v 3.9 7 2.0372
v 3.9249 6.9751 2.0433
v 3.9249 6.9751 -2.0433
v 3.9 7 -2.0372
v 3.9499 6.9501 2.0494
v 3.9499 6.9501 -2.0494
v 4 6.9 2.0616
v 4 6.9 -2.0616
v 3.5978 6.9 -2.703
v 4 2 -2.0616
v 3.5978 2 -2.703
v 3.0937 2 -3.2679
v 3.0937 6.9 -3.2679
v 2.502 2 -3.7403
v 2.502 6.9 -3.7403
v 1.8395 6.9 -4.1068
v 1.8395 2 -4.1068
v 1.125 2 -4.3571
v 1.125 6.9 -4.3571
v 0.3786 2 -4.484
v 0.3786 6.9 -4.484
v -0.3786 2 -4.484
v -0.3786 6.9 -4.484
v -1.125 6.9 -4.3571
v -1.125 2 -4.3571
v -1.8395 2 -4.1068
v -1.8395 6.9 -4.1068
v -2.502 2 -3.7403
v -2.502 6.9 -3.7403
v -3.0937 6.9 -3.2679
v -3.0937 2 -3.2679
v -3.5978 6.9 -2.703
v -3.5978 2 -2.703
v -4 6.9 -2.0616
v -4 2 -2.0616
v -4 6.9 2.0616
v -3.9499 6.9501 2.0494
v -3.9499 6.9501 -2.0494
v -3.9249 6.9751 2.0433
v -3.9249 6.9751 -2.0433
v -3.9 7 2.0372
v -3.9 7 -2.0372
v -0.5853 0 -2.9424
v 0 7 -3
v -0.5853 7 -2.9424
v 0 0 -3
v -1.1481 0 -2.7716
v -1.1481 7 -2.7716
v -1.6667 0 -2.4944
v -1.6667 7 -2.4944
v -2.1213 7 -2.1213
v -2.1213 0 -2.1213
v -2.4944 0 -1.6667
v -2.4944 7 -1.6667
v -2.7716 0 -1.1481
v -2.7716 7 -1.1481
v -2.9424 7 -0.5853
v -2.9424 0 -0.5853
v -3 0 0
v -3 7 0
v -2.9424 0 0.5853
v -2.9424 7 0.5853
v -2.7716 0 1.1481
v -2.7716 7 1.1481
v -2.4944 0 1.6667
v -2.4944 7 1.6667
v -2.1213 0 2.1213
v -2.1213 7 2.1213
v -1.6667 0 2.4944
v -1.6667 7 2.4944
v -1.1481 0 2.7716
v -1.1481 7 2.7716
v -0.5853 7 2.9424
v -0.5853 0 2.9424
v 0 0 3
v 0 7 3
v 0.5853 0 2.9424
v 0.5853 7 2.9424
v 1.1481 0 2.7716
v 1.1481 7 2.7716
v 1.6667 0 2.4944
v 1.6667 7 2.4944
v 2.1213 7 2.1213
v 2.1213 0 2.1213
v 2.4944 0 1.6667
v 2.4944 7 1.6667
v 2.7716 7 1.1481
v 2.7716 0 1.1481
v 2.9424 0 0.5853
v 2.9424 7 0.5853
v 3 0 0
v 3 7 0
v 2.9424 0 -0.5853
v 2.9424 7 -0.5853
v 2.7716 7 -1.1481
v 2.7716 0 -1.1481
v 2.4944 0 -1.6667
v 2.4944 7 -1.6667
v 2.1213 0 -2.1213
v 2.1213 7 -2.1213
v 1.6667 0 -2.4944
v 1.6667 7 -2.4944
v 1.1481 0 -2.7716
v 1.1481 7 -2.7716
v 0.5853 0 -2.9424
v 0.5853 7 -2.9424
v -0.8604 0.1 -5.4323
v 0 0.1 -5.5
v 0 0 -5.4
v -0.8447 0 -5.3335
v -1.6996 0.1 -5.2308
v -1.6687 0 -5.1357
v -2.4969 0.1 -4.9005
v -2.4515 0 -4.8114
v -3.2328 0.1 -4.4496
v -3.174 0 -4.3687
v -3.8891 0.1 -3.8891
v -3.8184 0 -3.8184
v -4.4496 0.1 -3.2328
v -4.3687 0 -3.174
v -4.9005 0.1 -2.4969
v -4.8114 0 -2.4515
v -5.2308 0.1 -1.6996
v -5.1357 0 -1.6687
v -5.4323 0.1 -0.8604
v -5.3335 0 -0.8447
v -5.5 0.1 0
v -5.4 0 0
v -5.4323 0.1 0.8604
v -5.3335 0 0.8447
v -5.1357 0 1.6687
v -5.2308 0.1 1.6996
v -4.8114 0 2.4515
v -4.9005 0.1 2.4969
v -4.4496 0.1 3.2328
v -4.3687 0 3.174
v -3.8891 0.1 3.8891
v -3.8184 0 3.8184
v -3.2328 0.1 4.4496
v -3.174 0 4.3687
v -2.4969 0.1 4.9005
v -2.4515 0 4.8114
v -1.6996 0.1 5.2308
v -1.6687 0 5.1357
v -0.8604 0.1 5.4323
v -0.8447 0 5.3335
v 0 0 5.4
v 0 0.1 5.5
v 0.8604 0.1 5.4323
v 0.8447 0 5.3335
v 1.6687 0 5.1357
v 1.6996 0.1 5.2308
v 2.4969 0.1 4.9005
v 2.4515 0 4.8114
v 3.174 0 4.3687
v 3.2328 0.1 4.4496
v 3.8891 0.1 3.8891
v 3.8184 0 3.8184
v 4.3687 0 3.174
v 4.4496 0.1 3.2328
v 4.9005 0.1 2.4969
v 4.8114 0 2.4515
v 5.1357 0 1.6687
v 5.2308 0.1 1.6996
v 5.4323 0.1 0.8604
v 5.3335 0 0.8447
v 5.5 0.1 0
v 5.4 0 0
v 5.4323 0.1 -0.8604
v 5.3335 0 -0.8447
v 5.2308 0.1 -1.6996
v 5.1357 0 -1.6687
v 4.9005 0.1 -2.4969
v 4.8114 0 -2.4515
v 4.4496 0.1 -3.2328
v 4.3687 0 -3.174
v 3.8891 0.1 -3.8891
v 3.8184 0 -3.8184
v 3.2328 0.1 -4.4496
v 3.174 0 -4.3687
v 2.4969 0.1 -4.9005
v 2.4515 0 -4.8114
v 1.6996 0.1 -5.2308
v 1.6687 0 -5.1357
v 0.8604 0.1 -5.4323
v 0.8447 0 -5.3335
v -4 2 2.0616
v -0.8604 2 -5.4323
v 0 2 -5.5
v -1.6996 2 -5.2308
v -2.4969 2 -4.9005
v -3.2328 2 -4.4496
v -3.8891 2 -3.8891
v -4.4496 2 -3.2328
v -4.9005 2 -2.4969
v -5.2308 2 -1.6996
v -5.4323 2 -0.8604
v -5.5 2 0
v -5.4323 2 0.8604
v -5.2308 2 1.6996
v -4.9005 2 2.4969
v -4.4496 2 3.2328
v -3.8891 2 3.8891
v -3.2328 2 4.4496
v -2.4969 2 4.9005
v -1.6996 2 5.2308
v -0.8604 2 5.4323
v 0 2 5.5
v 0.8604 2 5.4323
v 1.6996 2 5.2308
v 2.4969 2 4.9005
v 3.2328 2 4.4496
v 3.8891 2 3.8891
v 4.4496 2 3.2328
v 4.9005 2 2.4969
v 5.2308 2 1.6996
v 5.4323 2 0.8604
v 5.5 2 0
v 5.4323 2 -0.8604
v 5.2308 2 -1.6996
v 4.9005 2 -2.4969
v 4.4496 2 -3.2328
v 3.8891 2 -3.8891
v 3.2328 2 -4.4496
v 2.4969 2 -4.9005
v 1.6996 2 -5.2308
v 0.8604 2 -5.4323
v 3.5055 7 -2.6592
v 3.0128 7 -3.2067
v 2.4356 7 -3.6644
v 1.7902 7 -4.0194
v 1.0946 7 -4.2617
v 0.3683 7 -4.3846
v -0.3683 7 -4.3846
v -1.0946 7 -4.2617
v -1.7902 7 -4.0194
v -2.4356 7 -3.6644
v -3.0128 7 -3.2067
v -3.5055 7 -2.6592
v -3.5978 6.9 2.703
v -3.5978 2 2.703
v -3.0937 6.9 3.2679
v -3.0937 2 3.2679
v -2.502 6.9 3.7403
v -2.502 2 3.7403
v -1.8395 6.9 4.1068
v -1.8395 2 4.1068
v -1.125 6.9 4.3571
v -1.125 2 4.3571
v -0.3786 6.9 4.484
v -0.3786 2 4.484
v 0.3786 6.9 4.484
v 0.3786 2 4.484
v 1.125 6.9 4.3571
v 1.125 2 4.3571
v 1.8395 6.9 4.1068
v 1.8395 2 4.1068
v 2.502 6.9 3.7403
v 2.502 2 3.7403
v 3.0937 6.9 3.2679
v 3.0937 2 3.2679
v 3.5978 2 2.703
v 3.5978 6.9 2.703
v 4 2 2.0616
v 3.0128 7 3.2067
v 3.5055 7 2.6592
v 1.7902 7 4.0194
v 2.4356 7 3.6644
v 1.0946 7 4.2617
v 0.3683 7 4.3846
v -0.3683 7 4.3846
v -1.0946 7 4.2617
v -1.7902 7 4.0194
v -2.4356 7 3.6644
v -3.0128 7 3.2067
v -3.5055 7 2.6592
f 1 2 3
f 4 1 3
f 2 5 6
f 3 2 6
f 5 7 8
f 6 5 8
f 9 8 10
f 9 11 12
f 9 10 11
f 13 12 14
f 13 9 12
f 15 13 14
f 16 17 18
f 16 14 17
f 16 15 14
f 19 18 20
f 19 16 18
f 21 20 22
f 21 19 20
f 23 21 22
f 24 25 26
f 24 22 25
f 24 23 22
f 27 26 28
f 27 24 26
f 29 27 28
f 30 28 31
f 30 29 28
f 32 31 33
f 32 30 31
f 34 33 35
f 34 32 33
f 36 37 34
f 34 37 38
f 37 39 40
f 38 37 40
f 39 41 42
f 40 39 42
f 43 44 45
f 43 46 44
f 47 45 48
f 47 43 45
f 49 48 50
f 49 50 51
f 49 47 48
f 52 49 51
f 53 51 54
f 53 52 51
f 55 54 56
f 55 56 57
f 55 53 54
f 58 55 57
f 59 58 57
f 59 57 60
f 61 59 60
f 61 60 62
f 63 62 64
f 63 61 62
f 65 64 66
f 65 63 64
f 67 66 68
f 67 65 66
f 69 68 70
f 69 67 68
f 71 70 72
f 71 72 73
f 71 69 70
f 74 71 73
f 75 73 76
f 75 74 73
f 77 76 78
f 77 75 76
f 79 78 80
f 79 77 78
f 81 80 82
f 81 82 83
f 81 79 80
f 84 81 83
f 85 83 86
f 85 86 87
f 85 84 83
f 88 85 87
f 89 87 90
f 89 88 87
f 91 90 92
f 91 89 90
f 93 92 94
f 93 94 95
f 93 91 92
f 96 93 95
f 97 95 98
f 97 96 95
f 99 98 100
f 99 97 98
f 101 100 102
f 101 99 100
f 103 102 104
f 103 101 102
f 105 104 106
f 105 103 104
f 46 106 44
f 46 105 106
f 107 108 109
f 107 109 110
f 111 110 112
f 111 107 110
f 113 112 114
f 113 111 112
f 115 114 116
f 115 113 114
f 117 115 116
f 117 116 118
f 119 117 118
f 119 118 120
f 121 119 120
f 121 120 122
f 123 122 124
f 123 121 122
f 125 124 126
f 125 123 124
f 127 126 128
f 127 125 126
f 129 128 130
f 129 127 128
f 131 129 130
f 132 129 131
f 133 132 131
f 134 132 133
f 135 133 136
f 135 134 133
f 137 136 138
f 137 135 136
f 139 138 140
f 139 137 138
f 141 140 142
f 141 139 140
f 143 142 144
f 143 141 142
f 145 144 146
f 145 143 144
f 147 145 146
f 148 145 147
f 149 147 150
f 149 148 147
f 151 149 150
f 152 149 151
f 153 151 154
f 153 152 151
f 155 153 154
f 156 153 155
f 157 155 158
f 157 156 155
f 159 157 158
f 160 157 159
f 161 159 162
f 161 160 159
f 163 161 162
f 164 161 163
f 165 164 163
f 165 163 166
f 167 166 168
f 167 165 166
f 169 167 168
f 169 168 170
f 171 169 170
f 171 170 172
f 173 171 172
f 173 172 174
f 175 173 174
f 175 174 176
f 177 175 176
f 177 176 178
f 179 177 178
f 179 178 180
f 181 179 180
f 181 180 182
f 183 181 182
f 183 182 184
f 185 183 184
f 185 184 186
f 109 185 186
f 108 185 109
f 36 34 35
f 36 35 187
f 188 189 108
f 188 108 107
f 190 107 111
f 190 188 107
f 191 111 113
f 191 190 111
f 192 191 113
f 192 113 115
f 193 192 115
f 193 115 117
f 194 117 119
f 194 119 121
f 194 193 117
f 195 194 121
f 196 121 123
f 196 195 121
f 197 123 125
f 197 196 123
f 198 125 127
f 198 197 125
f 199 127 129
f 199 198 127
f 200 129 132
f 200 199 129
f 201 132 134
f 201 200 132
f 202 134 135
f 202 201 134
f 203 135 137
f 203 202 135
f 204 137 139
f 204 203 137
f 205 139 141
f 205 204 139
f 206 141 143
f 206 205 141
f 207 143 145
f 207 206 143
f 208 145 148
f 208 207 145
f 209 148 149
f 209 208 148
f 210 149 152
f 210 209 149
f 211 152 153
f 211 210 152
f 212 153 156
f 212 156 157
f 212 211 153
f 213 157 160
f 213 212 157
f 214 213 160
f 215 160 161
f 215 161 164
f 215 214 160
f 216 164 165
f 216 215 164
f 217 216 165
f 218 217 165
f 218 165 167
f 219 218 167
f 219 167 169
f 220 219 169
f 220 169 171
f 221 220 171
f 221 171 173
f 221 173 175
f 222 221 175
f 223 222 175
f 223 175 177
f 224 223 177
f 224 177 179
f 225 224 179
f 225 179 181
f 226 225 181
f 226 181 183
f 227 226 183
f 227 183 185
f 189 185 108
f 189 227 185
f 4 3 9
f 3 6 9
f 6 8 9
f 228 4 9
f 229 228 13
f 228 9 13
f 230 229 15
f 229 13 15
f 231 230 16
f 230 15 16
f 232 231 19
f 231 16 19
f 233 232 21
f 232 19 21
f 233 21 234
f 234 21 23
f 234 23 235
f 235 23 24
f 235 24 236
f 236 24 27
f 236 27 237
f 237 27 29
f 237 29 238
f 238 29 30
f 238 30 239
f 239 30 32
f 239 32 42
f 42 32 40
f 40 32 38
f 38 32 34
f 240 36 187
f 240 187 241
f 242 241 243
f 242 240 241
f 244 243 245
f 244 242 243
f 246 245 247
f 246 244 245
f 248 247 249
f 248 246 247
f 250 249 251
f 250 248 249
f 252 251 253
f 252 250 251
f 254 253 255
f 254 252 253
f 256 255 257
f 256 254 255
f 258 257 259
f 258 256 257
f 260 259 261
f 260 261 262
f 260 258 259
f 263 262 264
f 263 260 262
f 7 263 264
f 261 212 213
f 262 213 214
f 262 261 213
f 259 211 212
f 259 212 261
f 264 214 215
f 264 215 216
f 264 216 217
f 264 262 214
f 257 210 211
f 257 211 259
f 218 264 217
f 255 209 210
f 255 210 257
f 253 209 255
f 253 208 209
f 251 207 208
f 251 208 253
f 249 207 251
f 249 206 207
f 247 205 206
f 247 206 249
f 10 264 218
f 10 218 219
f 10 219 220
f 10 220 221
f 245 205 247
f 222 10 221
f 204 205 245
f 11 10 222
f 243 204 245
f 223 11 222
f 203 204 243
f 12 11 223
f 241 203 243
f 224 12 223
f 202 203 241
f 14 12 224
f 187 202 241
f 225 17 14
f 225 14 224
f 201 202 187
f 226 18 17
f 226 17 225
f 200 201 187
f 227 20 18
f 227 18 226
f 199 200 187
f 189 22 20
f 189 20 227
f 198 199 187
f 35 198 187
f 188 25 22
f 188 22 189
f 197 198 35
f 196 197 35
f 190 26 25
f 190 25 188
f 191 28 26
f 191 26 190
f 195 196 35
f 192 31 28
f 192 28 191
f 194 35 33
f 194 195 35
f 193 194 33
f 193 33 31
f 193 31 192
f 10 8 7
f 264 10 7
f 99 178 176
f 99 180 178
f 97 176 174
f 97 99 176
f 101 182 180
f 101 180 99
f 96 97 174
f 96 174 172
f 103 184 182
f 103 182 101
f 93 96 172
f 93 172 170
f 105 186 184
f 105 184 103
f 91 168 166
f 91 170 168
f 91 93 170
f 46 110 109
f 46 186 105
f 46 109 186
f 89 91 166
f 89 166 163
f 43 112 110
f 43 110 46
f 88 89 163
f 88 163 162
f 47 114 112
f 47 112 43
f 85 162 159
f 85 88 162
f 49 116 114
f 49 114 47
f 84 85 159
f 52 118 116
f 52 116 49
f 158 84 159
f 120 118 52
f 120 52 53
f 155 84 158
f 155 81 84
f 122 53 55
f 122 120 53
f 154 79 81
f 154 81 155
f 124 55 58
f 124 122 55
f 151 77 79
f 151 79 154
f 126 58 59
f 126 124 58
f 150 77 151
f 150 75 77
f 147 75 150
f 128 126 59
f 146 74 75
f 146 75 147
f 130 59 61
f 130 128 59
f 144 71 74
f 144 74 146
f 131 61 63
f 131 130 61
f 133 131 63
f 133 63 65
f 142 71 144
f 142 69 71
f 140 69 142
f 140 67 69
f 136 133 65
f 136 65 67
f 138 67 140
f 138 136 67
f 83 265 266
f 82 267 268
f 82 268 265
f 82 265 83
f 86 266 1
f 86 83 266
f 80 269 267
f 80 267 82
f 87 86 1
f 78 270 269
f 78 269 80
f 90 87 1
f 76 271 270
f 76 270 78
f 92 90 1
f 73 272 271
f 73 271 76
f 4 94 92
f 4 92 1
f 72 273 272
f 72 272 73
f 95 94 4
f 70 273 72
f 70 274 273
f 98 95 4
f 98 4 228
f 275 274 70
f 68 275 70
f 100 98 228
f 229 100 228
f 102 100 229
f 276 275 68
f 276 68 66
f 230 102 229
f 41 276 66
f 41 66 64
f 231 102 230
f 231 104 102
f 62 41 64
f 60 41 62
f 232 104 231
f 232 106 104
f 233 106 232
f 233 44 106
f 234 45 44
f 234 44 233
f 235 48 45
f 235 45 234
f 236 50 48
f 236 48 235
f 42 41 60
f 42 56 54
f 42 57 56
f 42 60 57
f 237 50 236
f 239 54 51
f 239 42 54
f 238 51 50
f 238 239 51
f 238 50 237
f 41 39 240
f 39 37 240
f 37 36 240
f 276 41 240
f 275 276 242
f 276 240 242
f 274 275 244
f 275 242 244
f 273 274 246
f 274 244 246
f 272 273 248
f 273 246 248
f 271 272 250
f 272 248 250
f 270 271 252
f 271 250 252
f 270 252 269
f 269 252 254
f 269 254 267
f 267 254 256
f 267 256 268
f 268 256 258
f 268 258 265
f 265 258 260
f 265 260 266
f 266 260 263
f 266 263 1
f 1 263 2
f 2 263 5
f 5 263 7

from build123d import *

# Parameters (mm, degrees)
CUT_EXTRUDE1_DEPTH      = 11.464224768
CUT_EXTRUDE1_DEPTH_BACK = 5
CHAMFER1_SIZE           = 0.1


with BuildPart() as part:
    # Sketch1 → Revolve1 (revolve)
    with BuildSketch(Plane.XY, mode=Mode.PRIVATE) as revolve1_sk:
        Polygon((3, 0), (5.5, 0), (5.5, 2), (4.5, 2), (4.5, 7), (3, 7), align=None)
    revolve(revolve1_sk.sketch.rotate(Axis((0, 0, 0), (0, 1, 0)), 90), axis=Axis((0, 0, 0), (0, 1, 0)))

    # Sketch2 → Cut-Extrude1 (cut, two sides: drawn at the far end of the back side and taken through both)
    with BuildSketch(Plane(origin=(0, 7, 0), x_dir=(1, 0, 0), z_dir=(0, 1, 0)).offset(-CUT_EXTRUDE1_DEPTH_BACK)):
        with BuildLine():
            Line((-4, 2.061552813), (-4, -2.061552813))
            ThreePointArc((-4, -2.061552813), (-4.5, 0), (-4, 2.061552813))
        make_face()
        with BuildLine():
            Line((4, 2.061552813), (4, -2.061552813))
            ThreePointArc((4, -2.061552813), (4.5, 0), (4, 2.061552813))
        make_face()
    extrude(amount=CUT_EXTRUDE1_DEPTH + CUT_EXTRUDE1_DEPTH_BACK, mode=Mode.SUBTRACT)

    # Chamfer1
    chamfer1_edges = [part.edges().sort_by_distance(p)[0] for p in [
        (0, 7, 4.5),
        (0, 7, -4.5),
        (4, 7, 0),
        (-4, 7, 0),
        (0, 0, 5.5),
    ]]
    chamfer(chamfer1_edges, length=CHAMFER1_SIZE)


solid = part.part
